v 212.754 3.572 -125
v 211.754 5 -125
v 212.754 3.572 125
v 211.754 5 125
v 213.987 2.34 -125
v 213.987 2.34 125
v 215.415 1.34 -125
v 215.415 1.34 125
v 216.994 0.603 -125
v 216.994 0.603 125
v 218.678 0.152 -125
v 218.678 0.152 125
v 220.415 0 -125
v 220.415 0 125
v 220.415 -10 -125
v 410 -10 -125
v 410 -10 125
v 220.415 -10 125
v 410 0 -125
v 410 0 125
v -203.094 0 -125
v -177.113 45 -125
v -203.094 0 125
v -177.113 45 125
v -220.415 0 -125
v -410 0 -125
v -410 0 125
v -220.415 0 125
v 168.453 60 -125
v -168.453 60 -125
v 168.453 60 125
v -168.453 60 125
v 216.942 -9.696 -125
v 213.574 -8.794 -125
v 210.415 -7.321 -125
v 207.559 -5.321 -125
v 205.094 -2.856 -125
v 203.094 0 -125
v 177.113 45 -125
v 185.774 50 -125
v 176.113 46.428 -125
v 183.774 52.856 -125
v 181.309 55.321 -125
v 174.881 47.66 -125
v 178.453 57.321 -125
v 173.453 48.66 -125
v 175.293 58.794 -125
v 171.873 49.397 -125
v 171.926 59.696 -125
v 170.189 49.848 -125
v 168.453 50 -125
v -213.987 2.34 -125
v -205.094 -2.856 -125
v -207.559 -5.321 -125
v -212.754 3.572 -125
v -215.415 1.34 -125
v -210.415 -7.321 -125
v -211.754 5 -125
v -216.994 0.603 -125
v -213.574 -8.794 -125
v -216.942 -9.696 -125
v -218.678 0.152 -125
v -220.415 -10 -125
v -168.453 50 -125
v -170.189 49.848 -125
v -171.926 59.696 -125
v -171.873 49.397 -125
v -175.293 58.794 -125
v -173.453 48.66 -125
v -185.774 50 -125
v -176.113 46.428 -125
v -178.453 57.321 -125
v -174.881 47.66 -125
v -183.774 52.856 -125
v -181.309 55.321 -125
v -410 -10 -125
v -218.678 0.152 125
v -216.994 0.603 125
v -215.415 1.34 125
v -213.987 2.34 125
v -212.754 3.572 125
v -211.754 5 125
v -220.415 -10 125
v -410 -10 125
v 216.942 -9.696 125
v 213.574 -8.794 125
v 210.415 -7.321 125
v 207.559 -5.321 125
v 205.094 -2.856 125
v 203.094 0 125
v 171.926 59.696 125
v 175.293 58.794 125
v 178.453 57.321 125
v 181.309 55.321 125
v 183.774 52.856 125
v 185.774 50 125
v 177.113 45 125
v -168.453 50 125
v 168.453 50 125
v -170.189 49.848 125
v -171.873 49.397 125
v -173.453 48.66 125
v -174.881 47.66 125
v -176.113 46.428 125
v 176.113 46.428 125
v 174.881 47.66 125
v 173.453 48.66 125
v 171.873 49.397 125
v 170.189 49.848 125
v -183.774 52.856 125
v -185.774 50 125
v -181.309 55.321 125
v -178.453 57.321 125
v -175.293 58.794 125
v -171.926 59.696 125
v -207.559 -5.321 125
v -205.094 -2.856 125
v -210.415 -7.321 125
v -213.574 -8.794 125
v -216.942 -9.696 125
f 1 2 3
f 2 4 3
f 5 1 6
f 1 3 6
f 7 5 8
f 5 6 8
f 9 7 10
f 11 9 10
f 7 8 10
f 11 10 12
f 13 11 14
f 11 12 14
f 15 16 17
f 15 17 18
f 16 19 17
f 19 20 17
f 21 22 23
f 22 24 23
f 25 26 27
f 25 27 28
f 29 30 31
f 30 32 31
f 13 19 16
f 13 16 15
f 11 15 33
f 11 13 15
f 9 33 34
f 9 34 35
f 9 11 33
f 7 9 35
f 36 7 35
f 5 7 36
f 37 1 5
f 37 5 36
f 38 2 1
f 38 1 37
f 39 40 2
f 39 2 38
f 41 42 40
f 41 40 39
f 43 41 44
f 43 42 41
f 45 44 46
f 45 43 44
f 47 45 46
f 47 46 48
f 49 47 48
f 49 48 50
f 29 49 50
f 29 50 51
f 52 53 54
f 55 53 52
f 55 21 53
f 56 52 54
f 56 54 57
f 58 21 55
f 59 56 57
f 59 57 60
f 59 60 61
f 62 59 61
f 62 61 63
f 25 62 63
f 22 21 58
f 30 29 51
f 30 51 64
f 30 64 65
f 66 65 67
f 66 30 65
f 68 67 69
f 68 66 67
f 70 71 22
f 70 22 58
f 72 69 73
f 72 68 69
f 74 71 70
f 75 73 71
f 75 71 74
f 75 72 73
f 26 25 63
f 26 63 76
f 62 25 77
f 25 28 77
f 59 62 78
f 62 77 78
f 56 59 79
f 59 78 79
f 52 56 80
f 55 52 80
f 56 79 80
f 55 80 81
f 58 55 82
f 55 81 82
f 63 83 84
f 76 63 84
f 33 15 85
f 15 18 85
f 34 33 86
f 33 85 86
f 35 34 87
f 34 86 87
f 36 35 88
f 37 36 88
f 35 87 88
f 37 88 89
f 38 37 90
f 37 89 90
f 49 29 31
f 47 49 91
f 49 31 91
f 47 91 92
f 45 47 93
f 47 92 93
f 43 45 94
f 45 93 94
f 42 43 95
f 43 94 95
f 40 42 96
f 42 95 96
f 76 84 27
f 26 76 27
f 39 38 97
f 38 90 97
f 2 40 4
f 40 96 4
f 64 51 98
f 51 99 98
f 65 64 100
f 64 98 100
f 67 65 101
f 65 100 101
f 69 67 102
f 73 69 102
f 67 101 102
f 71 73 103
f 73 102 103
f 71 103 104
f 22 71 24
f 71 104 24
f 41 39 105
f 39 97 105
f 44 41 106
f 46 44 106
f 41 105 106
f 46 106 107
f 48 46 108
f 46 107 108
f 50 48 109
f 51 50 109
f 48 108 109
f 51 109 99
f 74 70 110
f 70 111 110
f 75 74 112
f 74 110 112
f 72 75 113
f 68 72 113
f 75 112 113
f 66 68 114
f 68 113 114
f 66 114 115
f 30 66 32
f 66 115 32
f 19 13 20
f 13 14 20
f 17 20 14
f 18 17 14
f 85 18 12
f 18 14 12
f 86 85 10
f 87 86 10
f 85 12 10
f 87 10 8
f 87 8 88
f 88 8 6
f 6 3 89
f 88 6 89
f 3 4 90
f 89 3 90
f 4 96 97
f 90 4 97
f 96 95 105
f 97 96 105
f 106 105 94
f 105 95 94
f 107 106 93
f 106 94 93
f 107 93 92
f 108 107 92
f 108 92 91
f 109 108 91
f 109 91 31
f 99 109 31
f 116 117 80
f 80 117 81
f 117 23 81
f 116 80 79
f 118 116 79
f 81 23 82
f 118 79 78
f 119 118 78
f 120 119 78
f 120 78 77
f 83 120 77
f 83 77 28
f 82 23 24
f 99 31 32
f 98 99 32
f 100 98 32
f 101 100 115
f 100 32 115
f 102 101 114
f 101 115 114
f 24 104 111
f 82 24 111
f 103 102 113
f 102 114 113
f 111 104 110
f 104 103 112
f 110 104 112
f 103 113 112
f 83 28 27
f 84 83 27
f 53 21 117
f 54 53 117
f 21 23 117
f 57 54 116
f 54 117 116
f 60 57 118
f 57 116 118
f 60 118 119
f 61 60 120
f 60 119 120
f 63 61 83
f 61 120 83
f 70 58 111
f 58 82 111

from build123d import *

# Parameters (mm, degrees)
SM_BASE_FLANGE_1_DEPTH = 125


# Sheet-metal steps are written as plain solids
with BuildPart() as part:
    # Sketch 1 → 基体-法兰1 (new, symmetric)
    with BuildSketch(Plane.XY):
        with BuildLine():
            Line((-410, 0), (-220.414518843, 0))
            ThreePointArc((-220.414518843, 0), (-215.414518843, 1.339745962), (-211.754264805, 5))
            Line((-211.754264805, 5), (-185.773502692, 50))
            ThreePointArc((-185.773502692, 50), (-178.452994616, 57.320508076), (-168.452994616, 60))
            Line((-168.452994616, 60), (168.452994616, 60))
            ThreePointArc((168.452994616, 60), (178.452994616, 57.320508076), (185.773502692, 50))
            Line((185.773502692, 50), (211.754264805, 5))
            ThreePointArc((211.754264805, 5), (215.414518843, 1.339745962), (220.414518843, 0))
            Line((220.414518843, 0), (410, 0))
            Line((410, 0), (410, -10))
            Line((410, -10), (220.414518843, -10))
            ThreePointArc((220.414518843, -10), (210.414518843, -7.320508076), (203.094010768, 0))
            Line((203.094010768, 0), (177.113248654, 45))
            ThreePointArc((177.113248654, 45), (173.452994616, 48.660254038), (168.452994616, 50))
            Line((168.452994616, 50), (-168.452994616, 50))
            ThreePointArc((-168.452994616, 50), (-173.452994616, 48.660254038), (-177.113248654, 45))
            Line((-177.113248654, 45), (-203.094010768, 0))
            ThreePointArc((-203.094010768, 0), (-210.414518843, -7.320508076), (-220.414518843, -10))
            Line((-220.414518843, -10), (-410, -10))
            Line((-410, -10), (-410, 0))
        make_face()
    extrude(amount=SM_BASE_FLANGE_1_DEPTH, both=True)


solid = part.part
